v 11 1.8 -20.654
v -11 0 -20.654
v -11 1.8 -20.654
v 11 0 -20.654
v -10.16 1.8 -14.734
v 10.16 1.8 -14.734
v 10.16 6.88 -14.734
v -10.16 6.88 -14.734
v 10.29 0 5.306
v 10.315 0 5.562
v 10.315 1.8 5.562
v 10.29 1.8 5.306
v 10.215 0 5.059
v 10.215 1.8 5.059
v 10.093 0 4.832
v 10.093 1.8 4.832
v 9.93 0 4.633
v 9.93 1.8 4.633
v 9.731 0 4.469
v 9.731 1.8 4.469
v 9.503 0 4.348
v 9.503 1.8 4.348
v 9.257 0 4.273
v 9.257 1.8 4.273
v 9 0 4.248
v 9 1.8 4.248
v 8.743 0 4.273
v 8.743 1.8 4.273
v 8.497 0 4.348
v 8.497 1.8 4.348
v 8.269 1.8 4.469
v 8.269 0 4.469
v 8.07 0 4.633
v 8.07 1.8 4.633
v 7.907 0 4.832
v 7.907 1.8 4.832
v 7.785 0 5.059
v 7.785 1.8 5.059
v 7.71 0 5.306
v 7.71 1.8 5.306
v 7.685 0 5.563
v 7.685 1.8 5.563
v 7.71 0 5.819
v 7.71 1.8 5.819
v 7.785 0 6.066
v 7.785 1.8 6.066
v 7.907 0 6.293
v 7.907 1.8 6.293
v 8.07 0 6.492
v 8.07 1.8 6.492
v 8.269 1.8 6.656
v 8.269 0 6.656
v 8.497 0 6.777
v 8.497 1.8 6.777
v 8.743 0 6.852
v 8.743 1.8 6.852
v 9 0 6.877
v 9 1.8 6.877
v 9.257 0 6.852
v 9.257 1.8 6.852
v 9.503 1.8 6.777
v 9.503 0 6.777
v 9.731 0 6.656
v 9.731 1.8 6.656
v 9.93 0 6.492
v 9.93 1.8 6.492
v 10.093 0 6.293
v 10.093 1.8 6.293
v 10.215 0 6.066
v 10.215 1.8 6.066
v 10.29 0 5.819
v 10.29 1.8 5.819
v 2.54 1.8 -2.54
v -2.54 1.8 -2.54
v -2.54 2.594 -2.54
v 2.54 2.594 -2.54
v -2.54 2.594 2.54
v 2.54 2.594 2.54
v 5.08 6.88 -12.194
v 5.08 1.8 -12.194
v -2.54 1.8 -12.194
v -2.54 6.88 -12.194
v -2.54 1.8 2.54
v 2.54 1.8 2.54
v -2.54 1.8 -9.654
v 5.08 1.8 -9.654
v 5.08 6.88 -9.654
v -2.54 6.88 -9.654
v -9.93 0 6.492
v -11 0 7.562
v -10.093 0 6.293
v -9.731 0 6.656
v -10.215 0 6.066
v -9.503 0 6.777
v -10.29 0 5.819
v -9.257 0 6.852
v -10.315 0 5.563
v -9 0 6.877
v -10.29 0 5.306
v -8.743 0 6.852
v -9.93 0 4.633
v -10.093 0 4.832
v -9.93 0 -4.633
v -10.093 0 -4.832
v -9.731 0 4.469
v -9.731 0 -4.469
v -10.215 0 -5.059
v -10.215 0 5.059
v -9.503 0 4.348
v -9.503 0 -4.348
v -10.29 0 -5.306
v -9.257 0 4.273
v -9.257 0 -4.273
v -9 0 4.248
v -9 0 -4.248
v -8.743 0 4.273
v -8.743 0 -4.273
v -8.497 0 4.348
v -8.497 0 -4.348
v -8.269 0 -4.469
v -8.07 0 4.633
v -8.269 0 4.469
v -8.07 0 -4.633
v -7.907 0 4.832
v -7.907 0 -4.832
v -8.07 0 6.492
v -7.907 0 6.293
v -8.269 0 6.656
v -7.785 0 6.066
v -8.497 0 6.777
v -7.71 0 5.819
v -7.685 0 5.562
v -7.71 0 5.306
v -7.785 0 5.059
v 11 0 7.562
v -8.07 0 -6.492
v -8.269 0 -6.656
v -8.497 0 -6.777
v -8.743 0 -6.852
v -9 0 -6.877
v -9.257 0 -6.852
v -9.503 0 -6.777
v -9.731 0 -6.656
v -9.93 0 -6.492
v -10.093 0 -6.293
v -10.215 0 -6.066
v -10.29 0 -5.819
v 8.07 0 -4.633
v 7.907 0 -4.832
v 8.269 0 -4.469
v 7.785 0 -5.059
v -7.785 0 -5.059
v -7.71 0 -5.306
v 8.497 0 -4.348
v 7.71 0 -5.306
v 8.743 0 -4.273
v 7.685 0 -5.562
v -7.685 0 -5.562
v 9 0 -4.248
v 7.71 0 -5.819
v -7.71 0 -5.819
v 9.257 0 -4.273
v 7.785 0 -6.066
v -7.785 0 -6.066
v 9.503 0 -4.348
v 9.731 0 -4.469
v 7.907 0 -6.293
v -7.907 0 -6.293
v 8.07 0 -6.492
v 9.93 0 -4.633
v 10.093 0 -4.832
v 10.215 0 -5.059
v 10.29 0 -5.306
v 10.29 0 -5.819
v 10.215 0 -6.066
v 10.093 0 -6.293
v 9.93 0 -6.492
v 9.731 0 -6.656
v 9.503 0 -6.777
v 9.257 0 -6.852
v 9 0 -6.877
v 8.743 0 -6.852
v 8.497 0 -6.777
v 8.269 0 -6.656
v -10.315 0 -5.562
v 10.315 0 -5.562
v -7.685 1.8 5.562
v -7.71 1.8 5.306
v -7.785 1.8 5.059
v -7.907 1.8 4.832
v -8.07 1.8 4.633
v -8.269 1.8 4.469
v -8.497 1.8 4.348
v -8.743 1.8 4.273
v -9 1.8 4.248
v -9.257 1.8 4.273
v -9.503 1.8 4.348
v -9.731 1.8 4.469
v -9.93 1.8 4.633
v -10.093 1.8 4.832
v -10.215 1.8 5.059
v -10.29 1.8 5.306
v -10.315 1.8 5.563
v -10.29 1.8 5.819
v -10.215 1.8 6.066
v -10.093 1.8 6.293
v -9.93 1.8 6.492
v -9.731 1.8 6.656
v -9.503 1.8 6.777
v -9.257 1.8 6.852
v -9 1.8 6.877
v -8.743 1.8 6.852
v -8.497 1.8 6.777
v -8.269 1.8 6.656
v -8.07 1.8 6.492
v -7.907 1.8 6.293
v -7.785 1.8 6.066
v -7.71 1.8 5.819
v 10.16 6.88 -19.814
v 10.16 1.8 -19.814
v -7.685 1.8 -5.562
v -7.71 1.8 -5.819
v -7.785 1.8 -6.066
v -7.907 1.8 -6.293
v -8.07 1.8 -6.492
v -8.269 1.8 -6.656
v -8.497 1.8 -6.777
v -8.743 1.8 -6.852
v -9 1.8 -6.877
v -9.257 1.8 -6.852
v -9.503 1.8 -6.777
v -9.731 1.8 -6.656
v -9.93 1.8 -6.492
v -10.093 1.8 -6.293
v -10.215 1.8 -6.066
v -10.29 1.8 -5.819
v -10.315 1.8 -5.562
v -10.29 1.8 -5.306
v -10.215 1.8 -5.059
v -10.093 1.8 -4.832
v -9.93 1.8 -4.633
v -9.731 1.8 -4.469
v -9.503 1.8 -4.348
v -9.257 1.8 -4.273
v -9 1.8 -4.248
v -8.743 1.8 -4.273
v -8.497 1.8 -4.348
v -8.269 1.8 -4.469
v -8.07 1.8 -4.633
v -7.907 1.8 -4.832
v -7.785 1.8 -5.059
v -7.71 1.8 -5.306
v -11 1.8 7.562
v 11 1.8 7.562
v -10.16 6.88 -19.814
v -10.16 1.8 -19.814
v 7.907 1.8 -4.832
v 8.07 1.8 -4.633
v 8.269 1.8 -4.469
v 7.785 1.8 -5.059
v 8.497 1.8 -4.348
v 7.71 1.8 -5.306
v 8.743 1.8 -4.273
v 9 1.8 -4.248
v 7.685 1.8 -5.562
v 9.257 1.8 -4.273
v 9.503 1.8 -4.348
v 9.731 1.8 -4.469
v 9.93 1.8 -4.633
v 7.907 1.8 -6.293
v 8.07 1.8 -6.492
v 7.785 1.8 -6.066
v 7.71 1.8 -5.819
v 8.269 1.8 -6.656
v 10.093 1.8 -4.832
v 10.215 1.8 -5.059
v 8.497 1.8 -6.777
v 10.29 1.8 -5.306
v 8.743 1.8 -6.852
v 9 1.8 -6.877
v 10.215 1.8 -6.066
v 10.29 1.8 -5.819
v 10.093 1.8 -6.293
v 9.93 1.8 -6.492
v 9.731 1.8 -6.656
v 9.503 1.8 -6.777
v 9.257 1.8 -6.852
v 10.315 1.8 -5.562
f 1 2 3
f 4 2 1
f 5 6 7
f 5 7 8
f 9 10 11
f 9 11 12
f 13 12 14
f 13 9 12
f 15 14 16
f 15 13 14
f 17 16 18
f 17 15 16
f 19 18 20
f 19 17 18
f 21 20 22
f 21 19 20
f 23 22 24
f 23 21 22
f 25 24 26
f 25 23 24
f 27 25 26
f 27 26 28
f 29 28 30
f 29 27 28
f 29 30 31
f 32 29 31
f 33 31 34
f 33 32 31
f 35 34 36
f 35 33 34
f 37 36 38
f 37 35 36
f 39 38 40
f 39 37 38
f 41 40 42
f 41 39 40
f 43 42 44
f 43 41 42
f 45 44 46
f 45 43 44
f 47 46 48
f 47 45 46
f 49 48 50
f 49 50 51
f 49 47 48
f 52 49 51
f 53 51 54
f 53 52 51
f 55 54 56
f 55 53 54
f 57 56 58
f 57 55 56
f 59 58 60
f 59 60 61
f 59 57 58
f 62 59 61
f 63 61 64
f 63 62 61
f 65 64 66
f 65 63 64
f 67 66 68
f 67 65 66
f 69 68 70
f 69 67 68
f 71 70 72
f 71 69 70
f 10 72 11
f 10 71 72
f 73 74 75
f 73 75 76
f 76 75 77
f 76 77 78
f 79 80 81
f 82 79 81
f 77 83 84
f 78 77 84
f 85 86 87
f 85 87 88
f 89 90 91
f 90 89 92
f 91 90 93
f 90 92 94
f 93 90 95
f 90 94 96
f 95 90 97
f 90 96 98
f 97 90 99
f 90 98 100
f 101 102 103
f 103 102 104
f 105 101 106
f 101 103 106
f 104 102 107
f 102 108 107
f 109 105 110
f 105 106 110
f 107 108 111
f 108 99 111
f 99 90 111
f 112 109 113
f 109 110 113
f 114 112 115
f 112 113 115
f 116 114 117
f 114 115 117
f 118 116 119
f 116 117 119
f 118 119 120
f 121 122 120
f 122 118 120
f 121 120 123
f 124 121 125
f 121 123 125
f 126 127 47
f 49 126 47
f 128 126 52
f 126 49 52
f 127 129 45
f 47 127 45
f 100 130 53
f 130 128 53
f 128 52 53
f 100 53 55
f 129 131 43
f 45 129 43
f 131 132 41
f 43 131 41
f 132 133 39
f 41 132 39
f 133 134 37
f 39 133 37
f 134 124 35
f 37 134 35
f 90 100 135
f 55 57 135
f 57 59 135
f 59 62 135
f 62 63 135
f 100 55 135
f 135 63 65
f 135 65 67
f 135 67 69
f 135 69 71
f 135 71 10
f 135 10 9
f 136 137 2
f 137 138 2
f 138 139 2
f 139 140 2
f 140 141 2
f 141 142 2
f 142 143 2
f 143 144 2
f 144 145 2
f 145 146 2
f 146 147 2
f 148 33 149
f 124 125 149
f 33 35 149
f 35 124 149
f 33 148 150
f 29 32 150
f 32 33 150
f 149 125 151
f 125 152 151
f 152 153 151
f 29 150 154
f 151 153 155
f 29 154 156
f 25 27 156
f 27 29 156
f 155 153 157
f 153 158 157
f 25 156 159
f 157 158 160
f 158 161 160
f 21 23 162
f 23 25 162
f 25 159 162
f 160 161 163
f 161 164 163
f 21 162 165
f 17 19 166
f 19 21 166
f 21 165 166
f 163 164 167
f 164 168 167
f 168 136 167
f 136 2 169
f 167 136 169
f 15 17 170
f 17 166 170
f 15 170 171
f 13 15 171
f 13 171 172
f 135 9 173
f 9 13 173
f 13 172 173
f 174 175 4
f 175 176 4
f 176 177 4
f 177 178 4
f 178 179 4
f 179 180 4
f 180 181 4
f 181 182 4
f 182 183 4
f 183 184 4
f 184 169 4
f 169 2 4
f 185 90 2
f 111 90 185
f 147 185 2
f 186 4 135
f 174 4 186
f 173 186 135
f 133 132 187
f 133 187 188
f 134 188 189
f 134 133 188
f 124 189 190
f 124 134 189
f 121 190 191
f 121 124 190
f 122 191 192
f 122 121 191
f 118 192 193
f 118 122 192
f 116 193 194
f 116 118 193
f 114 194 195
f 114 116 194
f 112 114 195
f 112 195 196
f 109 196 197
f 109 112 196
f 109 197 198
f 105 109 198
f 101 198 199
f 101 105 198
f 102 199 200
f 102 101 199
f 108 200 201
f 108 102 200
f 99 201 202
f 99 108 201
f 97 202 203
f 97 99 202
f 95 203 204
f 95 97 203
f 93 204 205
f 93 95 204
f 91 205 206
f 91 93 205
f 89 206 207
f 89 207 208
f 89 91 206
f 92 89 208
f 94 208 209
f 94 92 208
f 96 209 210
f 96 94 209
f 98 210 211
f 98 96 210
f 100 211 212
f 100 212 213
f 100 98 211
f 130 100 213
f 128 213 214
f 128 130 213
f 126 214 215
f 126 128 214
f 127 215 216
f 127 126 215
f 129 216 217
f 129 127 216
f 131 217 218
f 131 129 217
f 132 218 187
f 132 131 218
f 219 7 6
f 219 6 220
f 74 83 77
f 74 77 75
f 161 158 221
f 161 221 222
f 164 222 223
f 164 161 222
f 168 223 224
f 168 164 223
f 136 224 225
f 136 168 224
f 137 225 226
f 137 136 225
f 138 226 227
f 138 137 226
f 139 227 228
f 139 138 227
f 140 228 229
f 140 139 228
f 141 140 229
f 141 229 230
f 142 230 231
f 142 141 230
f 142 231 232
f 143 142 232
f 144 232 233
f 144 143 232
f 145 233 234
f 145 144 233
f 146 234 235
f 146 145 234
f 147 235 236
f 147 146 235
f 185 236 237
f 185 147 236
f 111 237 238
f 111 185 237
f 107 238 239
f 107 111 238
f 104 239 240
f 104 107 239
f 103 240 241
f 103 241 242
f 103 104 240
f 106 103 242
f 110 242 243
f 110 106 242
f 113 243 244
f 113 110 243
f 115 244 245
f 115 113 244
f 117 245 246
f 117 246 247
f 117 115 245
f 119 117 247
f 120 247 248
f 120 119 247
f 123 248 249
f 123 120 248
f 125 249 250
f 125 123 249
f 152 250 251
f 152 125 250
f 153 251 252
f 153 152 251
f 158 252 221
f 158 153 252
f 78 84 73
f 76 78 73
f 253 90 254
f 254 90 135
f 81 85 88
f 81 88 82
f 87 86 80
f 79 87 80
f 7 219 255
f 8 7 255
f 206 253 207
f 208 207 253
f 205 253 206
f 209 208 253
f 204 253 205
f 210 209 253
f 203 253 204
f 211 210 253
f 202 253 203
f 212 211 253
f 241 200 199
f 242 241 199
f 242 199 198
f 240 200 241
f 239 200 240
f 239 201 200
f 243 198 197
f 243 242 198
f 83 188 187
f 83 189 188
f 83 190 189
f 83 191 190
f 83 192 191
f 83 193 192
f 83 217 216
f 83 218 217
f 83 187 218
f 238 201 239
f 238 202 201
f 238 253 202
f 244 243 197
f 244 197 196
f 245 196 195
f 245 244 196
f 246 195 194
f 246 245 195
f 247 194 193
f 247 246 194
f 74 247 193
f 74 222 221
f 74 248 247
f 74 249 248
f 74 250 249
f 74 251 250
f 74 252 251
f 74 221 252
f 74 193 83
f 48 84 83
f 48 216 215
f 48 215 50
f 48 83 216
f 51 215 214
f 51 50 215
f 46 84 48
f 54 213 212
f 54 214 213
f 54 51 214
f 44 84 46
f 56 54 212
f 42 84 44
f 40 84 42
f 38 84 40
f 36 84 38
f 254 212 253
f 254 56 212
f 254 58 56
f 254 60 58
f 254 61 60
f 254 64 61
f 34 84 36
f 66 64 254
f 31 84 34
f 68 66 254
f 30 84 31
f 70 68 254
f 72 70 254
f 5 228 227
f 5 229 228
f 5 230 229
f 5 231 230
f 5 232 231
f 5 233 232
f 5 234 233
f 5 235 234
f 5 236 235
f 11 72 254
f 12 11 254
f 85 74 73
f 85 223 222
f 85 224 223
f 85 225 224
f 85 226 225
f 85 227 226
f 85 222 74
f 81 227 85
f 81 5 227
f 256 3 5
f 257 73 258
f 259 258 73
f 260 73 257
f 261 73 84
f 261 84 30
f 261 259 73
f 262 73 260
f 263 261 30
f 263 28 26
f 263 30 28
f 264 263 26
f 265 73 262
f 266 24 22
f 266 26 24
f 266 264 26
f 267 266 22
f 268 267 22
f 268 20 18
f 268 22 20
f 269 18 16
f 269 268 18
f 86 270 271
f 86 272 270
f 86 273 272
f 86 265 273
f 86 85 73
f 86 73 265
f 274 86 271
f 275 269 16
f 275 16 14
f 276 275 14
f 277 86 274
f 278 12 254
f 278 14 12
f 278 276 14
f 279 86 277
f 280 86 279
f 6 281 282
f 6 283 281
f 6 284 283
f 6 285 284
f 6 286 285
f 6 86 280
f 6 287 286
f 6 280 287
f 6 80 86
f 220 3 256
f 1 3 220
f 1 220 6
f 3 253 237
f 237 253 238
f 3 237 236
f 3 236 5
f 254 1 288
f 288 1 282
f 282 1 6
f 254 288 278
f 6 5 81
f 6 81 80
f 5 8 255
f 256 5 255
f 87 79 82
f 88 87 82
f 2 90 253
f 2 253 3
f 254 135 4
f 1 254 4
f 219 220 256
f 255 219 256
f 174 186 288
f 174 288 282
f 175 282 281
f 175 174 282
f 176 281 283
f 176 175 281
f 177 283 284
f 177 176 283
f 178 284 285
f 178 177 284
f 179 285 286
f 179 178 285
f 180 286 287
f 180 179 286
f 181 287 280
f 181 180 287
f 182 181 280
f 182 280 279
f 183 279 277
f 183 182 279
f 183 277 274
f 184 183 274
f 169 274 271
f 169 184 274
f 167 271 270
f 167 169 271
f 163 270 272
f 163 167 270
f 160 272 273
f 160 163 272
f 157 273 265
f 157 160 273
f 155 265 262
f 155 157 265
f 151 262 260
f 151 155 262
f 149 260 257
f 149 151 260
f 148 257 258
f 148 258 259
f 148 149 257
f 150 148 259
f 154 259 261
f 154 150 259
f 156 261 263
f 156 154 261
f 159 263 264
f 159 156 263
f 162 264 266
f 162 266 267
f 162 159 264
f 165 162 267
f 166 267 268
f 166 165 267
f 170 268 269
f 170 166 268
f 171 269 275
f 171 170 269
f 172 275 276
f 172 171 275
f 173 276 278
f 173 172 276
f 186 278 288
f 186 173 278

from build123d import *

# Parameters (mm, degrees)
SKETCH1_W           = 22
SKETCH1_H           = 28.216692514
SKETCH1_R           = 1.315
BOSS_EXTRUDE1_DEPTH = 1.8
SKETCH2_W           = 5.08
SKETCH2_H           = 5.08
BOSS_EXTRUDE2_DEPTH = 0.79375
BOSS_EXTRUDE3_START = -1.8
SKETCH3_W           = 7.62
SKETCH3_H           = 2.54
SKETCH3_W_2         = 20.32
SKETCH3_H_2         = 5.08
BOSS_EXTRUDE3_DEPTH = 5.08


with BuildPart() as part:
    # Sketch1 → Boss-Extrude1 (new body)
    with BuildSketch(Plane(origin=(0, 0, 0), x_dir=(1, 0, 0), z_dir=(0, 1, 0))):
        with Locations((0, 6.545846257)):
            Rectangle(SKETCH1_W, SKETCH1_H)
        with Locations((-9, 5.5625)):
            Circle(SKETCH1_R, mode=Mode.SUBTRACT)
        with Locations((9, 5.5625)):
            Circle(SKETCH1_R, mode=Mode.SUBTRACT)
        with Locations((9, -5.5625)):
            Circle(SKETCH1_R, mode=Mode.SUBTRACT)
        with Locations((-9, -5.5625)):
            Circle(SKETCH1_R, mode=Mode.SUBTRACT)
    extrude(amount=BOSS_EXTRUDE1_DEPTH)

    # Sketch2 → Boss-Extrude2 (add)
    with BuildSketch(Plane(origin=(0, 1.8, 0), x_dir=(1, 0, 0), z_dir=(0, 1, 0))):
        Rectangle(SKETCH2_W, SKETCH2_H)
    extrude(amount=BOSS_EXTRUDE2_DEPTH)

    # Sketch3 → Boss-Extrude3 (add)
    with BuildSketch(Plane(origin=(0, 0, 0), x_dir=(-1, 0, 0), z_dir=(0, -1, 0)).offset(BOSS_EXTRUDE3_START)):
        with Locations((-1.27, 10.924192514)):
            Rectangle(SKETCH3_W, SKETCH3_H)
        with Locations((0, 17.274192514)):
            Rectangle(SKETCH3_W_2, SKETCH3_H_2)
    extrude(amount=-BOSS_EXTRUDE3_DEPTH)


solid = part.part
